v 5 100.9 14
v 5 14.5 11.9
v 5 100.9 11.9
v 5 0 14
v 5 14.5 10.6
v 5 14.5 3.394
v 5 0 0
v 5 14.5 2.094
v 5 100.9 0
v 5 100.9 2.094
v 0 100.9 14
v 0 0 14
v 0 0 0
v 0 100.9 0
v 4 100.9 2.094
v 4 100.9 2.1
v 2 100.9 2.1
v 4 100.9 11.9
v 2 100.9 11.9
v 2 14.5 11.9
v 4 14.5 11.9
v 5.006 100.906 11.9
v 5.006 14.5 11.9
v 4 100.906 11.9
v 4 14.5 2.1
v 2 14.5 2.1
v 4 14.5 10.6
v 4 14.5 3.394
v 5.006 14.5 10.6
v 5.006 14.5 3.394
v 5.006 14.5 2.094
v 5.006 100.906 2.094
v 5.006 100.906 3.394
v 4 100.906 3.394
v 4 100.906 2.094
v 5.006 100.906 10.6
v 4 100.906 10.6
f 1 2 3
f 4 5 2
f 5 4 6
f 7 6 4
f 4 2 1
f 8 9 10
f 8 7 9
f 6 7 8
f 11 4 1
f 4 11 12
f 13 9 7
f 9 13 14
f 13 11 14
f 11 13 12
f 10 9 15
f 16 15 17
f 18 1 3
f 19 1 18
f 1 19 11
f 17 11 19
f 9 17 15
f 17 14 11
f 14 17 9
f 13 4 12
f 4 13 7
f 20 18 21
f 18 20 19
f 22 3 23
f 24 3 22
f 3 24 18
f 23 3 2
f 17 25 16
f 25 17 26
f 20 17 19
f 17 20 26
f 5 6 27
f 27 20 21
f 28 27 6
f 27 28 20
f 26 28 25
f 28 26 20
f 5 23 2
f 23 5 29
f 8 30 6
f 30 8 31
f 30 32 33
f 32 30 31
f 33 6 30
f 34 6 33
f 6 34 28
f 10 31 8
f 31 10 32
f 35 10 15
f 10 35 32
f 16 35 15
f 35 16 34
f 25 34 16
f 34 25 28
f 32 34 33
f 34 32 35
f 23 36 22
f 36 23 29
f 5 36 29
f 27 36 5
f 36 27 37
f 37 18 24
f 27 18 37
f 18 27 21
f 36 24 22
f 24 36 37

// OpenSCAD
MOUNT_LENGTH = 100.9;
MOUNT_HEIGHT = 14;

module mount(width) {
    MOUNT_WALL = 2.1;
    MOUNT_DEPTH = 3;
    MOUNT_LIP_DEPTH = 1;
    MOUNT_LIP_BEYOND_WALL = 3.4 - MOUNT_WALL;
    MOUNT_STOP = 14.5;

    e = .005678;

    cavity_length = MOUNT_LENGTH - MOUNT_STOP;
    cavity_height = MOUNT_HEIGHT - MOUNT_WALL * 2;
    cavity_z = (cavity_height - MOUNT_HEIGHT) / -2;

    module cavity(overage = e) {
        translate([
            width - MOUNT_DEPTH,
            MOUNT_STOP,
            cavity_z
        ]) {
            cube([
                MOUNT_DEPTH + overage,
                cavity_length + overage,
                cavity_height
            ]);
        }
    }

    module lips() {
        module lip() {
            cube([
                MOUNT_LIP_DEPTH + e,
                cavity_length + e,
                MOUNT_LIP_BEYOND_WALL
            ]);
        }

        for (z = [
            cavity_z - e,
            MOUNT_HEIGHT - cavity_z - MOUNT_LIP_BEYOND_WALL
        ]) {
            translate([
                width - MOUNT_LIP_DEPTH,
                MOUNT_STOP,
                z
            ]) {
                # lip();
            }
        }
    }

    difference() {
        cube([width, MOUNT_LENGTH, MOUNT_HEIGHT]);
        cavity();
    }

    lips();
}

mount(5);
